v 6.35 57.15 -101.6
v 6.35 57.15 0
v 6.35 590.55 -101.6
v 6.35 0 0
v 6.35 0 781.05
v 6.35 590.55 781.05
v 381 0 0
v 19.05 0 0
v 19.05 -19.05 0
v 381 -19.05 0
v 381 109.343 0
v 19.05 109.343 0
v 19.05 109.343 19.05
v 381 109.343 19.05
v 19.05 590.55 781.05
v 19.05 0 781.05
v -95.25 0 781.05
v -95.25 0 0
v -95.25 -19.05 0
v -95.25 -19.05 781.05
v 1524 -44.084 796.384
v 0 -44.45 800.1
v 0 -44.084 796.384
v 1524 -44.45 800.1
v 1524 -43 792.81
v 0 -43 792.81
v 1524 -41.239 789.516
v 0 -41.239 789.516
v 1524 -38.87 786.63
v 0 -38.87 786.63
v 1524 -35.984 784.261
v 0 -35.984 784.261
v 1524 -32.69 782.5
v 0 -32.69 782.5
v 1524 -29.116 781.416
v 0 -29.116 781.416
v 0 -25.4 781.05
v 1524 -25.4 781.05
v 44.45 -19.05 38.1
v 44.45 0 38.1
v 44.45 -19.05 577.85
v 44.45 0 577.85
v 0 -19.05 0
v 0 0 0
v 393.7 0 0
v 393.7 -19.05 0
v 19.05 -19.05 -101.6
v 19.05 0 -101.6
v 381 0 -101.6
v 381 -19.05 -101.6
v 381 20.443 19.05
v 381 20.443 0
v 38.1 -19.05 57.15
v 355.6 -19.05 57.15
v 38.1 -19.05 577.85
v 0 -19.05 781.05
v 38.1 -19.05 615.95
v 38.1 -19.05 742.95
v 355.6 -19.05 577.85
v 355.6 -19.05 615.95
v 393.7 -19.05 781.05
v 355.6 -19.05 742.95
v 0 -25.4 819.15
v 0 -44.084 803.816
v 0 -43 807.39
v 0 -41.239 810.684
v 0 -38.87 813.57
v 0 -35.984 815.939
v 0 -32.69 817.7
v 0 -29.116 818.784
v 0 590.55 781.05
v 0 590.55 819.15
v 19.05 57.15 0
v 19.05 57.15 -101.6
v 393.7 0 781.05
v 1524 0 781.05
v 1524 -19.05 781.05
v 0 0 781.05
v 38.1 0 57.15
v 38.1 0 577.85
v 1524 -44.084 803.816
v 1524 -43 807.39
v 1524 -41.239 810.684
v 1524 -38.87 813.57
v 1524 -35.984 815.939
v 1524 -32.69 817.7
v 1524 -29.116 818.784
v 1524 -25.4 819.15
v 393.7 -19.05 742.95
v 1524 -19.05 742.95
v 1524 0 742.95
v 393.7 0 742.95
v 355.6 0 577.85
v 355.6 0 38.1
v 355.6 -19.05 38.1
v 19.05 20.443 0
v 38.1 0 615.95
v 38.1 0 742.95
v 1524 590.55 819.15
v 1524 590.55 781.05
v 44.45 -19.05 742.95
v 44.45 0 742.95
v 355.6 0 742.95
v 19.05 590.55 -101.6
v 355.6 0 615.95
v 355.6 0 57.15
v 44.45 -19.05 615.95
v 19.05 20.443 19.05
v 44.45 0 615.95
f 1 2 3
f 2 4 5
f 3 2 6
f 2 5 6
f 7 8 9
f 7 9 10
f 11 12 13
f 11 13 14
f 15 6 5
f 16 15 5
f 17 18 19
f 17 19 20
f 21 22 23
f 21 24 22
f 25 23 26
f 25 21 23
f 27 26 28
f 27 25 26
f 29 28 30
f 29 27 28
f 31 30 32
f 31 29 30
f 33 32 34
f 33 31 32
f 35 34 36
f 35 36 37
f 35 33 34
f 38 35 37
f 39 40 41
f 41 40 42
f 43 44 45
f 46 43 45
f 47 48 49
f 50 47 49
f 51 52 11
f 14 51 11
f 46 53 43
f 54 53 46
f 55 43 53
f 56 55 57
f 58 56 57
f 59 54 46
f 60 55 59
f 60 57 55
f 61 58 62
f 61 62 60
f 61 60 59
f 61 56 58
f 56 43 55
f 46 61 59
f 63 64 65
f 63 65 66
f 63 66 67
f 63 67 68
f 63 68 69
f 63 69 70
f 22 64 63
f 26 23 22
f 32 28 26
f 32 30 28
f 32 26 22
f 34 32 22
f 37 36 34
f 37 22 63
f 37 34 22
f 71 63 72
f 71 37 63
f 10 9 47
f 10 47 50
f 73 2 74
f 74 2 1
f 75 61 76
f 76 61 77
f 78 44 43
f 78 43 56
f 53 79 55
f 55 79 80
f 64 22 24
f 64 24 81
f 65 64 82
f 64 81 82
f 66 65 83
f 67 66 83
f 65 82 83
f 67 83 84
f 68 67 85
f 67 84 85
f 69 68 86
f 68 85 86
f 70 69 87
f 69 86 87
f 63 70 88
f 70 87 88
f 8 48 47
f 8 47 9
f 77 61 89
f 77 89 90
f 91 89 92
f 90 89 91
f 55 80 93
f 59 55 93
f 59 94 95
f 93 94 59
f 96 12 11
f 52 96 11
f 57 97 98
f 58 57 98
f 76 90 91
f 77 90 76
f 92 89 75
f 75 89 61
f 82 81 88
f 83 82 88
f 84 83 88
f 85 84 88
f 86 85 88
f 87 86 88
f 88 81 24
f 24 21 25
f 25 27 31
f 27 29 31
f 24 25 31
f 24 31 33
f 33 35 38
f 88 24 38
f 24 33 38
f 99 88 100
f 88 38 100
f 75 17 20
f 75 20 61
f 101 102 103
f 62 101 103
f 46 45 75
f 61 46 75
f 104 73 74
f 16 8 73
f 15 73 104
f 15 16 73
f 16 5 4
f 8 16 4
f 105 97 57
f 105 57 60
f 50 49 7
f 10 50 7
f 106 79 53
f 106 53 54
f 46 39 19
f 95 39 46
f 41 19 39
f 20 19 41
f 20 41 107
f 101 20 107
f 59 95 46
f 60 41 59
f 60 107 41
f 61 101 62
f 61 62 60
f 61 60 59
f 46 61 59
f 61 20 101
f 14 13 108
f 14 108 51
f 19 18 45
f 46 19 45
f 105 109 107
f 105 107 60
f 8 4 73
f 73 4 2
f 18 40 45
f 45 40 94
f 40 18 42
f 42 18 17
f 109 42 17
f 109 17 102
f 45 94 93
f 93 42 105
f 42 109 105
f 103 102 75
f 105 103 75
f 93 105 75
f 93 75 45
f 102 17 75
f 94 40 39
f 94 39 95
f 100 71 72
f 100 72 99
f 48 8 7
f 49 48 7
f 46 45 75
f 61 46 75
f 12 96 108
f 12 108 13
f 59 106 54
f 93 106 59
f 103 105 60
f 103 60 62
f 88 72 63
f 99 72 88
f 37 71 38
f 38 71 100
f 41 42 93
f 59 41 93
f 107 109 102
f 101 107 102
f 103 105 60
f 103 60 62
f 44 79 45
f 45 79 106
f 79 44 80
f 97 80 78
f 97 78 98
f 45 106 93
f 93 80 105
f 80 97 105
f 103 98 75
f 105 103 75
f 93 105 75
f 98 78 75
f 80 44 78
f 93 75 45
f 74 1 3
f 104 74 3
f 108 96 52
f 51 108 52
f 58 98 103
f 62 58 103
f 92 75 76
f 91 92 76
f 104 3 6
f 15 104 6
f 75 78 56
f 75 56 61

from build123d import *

# Parameters (mm, degrees)
F3_W      = 393.7
F3_H      = 781.05
F3_W_2    = 317.5
F3_H_2    = 520.7
F3_H_3    = 127
F4_DEPTH  = 19.05
F7_DEPTH  = 12.7
F8_W      = 361.95
F8_H      = 101.6
F9_DEPTH  = 19.05
F10_W     = 361.95
F10_H     = 88.9
F11_DEPTH = 19.05
F12_W     = 1130.3
F12_H     = 38.1
F13_DEPTH = 19.05
F14_W     = 1524
F14_H     = 635
F15_DEPTH = 38.1
F16_R     = 19.04999
F17_W     = 488.95
F17_H     = 781.05
F17_W_2   = 311.15
F17_H_2   = 539.75
F17_H_3   = 127
F18_DEPTH = 19.05


# Not quite as in the source:
# - a variable given as a bare number and used for a length is read in inches; the dataset says mm whatever the document's units were
# - a fillet or chamfer is up to 0.001 mm smaller than in the source, because OpenCascade refuses the exact size


with BuildPart() as f4:
    # F3 (on Front) → F4 (new body)
    with BuildSketch(Plane.XZ):
        with Locations((196.85, 390.525)):
            Rectangle(F3_W, F3_H)
        with Locations((196.85, 317.5)):
            Rectangle(F3_W_2, F3_H_2, mode=Mode.SUBTRACT)
        with Locations((196.85, 679.45)):
            Rectangle(F3_W_2, F3_H_3, mode=Mode.SUBTRACT)
    extrude(amount=F4_DEPTH)


with BuildPart() as f7:
    # F6 (on offset) → F7 (new body)
    with BuildSketch(Plane.YZ.offset(6.35)):
        Polygon((590.55, 781.05), (0, 781.05), (0, 0), (57.15, 0), (57.15, -101.6), (590.55, -101.6), align=None)
    extrude(amount=F7_DEPTH)


with BuildPart() as f9:
    # F8 (on Front) → F9 (new body)
    with BuildSketch(Plane.XZ):
        with Locations((200.025, -50.8)):
            Rectangle(F8_W, F8_H)
    extrude(amount=F9_DEPTH)


with BuildPart() as f11:
    # F10 (on Top) → F11 (new body)
    with BuildSketch(Plane.XY):
        with Locations((200.025, 64.8930611602)):
            Rectangle(F10_W, F10_H)
    extrude(amount=F11_DEPTH)


with BuildPart() as f13:
    # F12 (on face) → F13 (new body, through all)
    with BuildSketch(Plane.XZ.offset(19.05)):
        with Locations((958.85, 762)):
            Rectangle(F12_W, F12_H)
    extrude(amount=-F13_DEPTH)


with BuildPart() as f15:
    # F14 (on face) → F15 (new body)
    with BuildSketch(Plane.XY.offset(781.05)):
        with Locations((762, 273.05)):
            Rectangle(F14_W, F14_H)
    extrude(amount=F15_DEPTH)

    # F16 (radius 19.05 in the source; OpenCascade refuses exactly that, so slightly less here)
    f16_edges = [f15.edges().sort_by_distance(p)[0] for p in [
        (762, -44.45, 819.15),
        (762, -44.45, 781.05),
    ]]
    fillet(f16_edges, radius=F16_R)


with BuildPart() as f18:
    # F17 (on face) → F18 (new body)
    with BuildSketch(Plane.XZ):
        with Locations((149.225, 390.525)):
            Rectangle(F17_W, F17_H)
        with Locations((200.025, 307.975)):
            Rectangle(F17_W_2, F17_H_2, mode=Mode.SUBTRACT)
        with Locations((200.025, 679.45)):
            Rectangle(F17_W_2, F17_H_3, mode=Mode.SUBTRACT)
    extrude(amount=F18_DEPTH)


solid = Compound([f4.part, f7.part, f9.part, f11.part, f13.part, f15.part, f18.part])
